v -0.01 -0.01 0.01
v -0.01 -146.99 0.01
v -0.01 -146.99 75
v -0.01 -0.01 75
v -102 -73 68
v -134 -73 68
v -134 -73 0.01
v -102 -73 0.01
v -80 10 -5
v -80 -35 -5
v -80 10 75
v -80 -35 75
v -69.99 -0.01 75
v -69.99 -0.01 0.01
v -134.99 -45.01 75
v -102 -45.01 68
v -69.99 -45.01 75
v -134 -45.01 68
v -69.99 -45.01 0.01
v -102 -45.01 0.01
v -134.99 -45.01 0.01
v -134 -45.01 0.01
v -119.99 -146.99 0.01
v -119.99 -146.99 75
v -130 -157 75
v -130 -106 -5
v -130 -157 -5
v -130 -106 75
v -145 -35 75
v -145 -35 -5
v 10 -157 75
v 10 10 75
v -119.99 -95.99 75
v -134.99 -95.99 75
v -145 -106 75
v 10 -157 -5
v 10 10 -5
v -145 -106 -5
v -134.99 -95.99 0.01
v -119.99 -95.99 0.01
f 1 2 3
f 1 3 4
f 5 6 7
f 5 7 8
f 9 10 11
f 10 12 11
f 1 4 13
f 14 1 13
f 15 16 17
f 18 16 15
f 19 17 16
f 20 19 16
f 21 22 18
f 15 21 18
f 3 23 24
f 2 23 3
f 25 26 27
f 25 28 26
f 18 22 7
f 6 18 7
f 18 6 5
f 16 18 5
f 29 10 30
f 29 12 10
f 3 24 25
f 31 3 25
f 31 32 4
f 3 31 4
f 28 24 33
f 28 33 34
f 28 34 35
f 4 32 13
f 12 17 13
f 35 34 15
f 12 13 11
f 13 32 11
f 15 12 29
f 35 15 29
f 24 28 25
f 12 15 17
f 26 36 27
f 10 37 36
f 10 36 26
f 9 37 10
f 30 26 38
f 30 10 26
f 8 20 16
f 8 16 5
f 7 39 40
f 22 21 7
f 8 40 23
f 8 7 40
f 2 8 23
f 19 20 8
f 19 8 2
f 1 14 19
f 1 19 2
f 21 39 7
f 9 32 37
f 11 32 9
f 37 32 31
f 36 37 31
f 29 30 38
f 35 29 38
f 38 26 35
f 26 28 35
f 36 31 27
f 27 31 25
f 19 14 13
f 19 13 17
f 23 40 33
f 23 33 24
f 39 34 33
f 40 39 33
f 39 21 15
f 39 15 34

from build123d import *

# Parameters (mm, degrees)
F1_DEPTH       = 75
F2_T           = -0.01
F5_DEPTH       = 10
F6_DEPTH       = 10
F7_DEPTH       = 10
F8_DEPTH       = 10
F9_DEPTH       = 10
F10_DEPTH      = 10
F11_DEPTH      = 10
F12_DEPTH      = 10
F13_DEPTH      = 5
F4_E8_BOTTOM_W = 32
F4_E8_BOTTOM_H = 28
F14_DEPTH      = 0.01
F15_DEPTH      = 68


with BuildPart() as f1:
    # F0 (on Top) → F1 (new body)
    with BuildSketch(Plane.XY):
        Polygon((0, -147), (0, 0), (-70, 0), (-70, -45), (-135, -45), (-135, -96), (-120, -96), (-120, -147), align=None)
    extrude(amount=F1_DEPTH)

    # F2
    f2_openings = [f1.faces().sort_by_distance(p)[0] for p in [
        (-58.321727, -80.461003, 75),
    ]]
    offset(amount=F2_T, openings=f2_openings, kind=Kind.INTERSECTION)

    # F5 (add): a face of the model
    f5_faces = [f1.faces().sort_by_distance(p)[0] for p in [
        (0, -73.5, 37.5),
    ]]
    extrude(f5_faces, amount=F5_DEPTH)

    # F6 (add): a face of the model
    f6_faces = [f1.faces().sort_by_distance(p)[0] for p in [
        (-30, 0, 37.5),
    ]]
    extrude(f6_faces, amount=F6_DEPTH)

    # F7 (add): a face of the model
    f7_faces = [f1.faces().sort_by_distance(p)[0] for p in [
        (-70, -17.5, 37.5),
    ]]
    extrude(f7_faces, amount=F7_DEPTH)

    # F8 (add): a face of the model
    f8_faces = [f1.faces().sort_by_distance(p)[0] for p in [
        (-107.5, -45, 37.5),
    ]]
    extrude(f8_faces, amount=F8_DEPTH)

    # F9 (add): a face of the model
    f9_faces = [f1.faces().sort_by_distance(p)[0] for p in [
        (-135, -65.5, 37.5),
    ]]
    extrude(f9_faces, amount=F9_DEPTH)

    # F10 (add): a face of the model
    f10_faces = [f1.faces().sort_by_distance(p)[0] for p in [
        (-132.5, -96, 37.5),
    ]]
    extrude(f10_faces, amount=F10_DEPTH)

    # F11 (add): a face of the model
    f11_faces = [f1.faces().sort_by_distance(p)[0] for p in [
        (-120, -126.5, 37.5),
    ]]
    extrude(f11_faces, amount=F11_DEPTH)

    # F12 (add): a face of the model
    f12_faces = [f1.faces().sort_by_distance(p)[0] for p in [
        (-60, -147, 37.5),
    ]]
    extrude(f12_faces, amount=F12_DEPTH)

    # F13 (add): a face of the model
    f13_faces = [f1.faces().sort_by_distance(p)[0] for p in [
        (-59.1569047083, -79.5398738455, 0),
    ]]
    extrude(f13_faces, amount=F13_DEPTH)

    # F4_E8_bottom (on explicit) → F14 (join, through all)
    with BuildSketch(Plane(origin=(-134, -45, 0), x_dir=(1, 0, 0), z_dir=(0, 0, -1))):
        with Locations((16, 14)):
            Rectangle(F4_E8_BOTTOM_W, F4_E8_BOTTOM_H)
    extrude(amount=-F14_DEPTH)

    # F4_E8_bottom (on explicit) → F15 (join)
    with BuildSketch(Plane(origin=(-134, -45, 0), x_dir=(1, 0, 0), z_dir=(0, 0, -1))):
        with Locations((16, 14)):
            Rectangle(F4_E8_BOTTOM_W, F4_E8_BOTTOM_H)
    extrude(amount=-F15_DEPTH)


solid = f1.part
